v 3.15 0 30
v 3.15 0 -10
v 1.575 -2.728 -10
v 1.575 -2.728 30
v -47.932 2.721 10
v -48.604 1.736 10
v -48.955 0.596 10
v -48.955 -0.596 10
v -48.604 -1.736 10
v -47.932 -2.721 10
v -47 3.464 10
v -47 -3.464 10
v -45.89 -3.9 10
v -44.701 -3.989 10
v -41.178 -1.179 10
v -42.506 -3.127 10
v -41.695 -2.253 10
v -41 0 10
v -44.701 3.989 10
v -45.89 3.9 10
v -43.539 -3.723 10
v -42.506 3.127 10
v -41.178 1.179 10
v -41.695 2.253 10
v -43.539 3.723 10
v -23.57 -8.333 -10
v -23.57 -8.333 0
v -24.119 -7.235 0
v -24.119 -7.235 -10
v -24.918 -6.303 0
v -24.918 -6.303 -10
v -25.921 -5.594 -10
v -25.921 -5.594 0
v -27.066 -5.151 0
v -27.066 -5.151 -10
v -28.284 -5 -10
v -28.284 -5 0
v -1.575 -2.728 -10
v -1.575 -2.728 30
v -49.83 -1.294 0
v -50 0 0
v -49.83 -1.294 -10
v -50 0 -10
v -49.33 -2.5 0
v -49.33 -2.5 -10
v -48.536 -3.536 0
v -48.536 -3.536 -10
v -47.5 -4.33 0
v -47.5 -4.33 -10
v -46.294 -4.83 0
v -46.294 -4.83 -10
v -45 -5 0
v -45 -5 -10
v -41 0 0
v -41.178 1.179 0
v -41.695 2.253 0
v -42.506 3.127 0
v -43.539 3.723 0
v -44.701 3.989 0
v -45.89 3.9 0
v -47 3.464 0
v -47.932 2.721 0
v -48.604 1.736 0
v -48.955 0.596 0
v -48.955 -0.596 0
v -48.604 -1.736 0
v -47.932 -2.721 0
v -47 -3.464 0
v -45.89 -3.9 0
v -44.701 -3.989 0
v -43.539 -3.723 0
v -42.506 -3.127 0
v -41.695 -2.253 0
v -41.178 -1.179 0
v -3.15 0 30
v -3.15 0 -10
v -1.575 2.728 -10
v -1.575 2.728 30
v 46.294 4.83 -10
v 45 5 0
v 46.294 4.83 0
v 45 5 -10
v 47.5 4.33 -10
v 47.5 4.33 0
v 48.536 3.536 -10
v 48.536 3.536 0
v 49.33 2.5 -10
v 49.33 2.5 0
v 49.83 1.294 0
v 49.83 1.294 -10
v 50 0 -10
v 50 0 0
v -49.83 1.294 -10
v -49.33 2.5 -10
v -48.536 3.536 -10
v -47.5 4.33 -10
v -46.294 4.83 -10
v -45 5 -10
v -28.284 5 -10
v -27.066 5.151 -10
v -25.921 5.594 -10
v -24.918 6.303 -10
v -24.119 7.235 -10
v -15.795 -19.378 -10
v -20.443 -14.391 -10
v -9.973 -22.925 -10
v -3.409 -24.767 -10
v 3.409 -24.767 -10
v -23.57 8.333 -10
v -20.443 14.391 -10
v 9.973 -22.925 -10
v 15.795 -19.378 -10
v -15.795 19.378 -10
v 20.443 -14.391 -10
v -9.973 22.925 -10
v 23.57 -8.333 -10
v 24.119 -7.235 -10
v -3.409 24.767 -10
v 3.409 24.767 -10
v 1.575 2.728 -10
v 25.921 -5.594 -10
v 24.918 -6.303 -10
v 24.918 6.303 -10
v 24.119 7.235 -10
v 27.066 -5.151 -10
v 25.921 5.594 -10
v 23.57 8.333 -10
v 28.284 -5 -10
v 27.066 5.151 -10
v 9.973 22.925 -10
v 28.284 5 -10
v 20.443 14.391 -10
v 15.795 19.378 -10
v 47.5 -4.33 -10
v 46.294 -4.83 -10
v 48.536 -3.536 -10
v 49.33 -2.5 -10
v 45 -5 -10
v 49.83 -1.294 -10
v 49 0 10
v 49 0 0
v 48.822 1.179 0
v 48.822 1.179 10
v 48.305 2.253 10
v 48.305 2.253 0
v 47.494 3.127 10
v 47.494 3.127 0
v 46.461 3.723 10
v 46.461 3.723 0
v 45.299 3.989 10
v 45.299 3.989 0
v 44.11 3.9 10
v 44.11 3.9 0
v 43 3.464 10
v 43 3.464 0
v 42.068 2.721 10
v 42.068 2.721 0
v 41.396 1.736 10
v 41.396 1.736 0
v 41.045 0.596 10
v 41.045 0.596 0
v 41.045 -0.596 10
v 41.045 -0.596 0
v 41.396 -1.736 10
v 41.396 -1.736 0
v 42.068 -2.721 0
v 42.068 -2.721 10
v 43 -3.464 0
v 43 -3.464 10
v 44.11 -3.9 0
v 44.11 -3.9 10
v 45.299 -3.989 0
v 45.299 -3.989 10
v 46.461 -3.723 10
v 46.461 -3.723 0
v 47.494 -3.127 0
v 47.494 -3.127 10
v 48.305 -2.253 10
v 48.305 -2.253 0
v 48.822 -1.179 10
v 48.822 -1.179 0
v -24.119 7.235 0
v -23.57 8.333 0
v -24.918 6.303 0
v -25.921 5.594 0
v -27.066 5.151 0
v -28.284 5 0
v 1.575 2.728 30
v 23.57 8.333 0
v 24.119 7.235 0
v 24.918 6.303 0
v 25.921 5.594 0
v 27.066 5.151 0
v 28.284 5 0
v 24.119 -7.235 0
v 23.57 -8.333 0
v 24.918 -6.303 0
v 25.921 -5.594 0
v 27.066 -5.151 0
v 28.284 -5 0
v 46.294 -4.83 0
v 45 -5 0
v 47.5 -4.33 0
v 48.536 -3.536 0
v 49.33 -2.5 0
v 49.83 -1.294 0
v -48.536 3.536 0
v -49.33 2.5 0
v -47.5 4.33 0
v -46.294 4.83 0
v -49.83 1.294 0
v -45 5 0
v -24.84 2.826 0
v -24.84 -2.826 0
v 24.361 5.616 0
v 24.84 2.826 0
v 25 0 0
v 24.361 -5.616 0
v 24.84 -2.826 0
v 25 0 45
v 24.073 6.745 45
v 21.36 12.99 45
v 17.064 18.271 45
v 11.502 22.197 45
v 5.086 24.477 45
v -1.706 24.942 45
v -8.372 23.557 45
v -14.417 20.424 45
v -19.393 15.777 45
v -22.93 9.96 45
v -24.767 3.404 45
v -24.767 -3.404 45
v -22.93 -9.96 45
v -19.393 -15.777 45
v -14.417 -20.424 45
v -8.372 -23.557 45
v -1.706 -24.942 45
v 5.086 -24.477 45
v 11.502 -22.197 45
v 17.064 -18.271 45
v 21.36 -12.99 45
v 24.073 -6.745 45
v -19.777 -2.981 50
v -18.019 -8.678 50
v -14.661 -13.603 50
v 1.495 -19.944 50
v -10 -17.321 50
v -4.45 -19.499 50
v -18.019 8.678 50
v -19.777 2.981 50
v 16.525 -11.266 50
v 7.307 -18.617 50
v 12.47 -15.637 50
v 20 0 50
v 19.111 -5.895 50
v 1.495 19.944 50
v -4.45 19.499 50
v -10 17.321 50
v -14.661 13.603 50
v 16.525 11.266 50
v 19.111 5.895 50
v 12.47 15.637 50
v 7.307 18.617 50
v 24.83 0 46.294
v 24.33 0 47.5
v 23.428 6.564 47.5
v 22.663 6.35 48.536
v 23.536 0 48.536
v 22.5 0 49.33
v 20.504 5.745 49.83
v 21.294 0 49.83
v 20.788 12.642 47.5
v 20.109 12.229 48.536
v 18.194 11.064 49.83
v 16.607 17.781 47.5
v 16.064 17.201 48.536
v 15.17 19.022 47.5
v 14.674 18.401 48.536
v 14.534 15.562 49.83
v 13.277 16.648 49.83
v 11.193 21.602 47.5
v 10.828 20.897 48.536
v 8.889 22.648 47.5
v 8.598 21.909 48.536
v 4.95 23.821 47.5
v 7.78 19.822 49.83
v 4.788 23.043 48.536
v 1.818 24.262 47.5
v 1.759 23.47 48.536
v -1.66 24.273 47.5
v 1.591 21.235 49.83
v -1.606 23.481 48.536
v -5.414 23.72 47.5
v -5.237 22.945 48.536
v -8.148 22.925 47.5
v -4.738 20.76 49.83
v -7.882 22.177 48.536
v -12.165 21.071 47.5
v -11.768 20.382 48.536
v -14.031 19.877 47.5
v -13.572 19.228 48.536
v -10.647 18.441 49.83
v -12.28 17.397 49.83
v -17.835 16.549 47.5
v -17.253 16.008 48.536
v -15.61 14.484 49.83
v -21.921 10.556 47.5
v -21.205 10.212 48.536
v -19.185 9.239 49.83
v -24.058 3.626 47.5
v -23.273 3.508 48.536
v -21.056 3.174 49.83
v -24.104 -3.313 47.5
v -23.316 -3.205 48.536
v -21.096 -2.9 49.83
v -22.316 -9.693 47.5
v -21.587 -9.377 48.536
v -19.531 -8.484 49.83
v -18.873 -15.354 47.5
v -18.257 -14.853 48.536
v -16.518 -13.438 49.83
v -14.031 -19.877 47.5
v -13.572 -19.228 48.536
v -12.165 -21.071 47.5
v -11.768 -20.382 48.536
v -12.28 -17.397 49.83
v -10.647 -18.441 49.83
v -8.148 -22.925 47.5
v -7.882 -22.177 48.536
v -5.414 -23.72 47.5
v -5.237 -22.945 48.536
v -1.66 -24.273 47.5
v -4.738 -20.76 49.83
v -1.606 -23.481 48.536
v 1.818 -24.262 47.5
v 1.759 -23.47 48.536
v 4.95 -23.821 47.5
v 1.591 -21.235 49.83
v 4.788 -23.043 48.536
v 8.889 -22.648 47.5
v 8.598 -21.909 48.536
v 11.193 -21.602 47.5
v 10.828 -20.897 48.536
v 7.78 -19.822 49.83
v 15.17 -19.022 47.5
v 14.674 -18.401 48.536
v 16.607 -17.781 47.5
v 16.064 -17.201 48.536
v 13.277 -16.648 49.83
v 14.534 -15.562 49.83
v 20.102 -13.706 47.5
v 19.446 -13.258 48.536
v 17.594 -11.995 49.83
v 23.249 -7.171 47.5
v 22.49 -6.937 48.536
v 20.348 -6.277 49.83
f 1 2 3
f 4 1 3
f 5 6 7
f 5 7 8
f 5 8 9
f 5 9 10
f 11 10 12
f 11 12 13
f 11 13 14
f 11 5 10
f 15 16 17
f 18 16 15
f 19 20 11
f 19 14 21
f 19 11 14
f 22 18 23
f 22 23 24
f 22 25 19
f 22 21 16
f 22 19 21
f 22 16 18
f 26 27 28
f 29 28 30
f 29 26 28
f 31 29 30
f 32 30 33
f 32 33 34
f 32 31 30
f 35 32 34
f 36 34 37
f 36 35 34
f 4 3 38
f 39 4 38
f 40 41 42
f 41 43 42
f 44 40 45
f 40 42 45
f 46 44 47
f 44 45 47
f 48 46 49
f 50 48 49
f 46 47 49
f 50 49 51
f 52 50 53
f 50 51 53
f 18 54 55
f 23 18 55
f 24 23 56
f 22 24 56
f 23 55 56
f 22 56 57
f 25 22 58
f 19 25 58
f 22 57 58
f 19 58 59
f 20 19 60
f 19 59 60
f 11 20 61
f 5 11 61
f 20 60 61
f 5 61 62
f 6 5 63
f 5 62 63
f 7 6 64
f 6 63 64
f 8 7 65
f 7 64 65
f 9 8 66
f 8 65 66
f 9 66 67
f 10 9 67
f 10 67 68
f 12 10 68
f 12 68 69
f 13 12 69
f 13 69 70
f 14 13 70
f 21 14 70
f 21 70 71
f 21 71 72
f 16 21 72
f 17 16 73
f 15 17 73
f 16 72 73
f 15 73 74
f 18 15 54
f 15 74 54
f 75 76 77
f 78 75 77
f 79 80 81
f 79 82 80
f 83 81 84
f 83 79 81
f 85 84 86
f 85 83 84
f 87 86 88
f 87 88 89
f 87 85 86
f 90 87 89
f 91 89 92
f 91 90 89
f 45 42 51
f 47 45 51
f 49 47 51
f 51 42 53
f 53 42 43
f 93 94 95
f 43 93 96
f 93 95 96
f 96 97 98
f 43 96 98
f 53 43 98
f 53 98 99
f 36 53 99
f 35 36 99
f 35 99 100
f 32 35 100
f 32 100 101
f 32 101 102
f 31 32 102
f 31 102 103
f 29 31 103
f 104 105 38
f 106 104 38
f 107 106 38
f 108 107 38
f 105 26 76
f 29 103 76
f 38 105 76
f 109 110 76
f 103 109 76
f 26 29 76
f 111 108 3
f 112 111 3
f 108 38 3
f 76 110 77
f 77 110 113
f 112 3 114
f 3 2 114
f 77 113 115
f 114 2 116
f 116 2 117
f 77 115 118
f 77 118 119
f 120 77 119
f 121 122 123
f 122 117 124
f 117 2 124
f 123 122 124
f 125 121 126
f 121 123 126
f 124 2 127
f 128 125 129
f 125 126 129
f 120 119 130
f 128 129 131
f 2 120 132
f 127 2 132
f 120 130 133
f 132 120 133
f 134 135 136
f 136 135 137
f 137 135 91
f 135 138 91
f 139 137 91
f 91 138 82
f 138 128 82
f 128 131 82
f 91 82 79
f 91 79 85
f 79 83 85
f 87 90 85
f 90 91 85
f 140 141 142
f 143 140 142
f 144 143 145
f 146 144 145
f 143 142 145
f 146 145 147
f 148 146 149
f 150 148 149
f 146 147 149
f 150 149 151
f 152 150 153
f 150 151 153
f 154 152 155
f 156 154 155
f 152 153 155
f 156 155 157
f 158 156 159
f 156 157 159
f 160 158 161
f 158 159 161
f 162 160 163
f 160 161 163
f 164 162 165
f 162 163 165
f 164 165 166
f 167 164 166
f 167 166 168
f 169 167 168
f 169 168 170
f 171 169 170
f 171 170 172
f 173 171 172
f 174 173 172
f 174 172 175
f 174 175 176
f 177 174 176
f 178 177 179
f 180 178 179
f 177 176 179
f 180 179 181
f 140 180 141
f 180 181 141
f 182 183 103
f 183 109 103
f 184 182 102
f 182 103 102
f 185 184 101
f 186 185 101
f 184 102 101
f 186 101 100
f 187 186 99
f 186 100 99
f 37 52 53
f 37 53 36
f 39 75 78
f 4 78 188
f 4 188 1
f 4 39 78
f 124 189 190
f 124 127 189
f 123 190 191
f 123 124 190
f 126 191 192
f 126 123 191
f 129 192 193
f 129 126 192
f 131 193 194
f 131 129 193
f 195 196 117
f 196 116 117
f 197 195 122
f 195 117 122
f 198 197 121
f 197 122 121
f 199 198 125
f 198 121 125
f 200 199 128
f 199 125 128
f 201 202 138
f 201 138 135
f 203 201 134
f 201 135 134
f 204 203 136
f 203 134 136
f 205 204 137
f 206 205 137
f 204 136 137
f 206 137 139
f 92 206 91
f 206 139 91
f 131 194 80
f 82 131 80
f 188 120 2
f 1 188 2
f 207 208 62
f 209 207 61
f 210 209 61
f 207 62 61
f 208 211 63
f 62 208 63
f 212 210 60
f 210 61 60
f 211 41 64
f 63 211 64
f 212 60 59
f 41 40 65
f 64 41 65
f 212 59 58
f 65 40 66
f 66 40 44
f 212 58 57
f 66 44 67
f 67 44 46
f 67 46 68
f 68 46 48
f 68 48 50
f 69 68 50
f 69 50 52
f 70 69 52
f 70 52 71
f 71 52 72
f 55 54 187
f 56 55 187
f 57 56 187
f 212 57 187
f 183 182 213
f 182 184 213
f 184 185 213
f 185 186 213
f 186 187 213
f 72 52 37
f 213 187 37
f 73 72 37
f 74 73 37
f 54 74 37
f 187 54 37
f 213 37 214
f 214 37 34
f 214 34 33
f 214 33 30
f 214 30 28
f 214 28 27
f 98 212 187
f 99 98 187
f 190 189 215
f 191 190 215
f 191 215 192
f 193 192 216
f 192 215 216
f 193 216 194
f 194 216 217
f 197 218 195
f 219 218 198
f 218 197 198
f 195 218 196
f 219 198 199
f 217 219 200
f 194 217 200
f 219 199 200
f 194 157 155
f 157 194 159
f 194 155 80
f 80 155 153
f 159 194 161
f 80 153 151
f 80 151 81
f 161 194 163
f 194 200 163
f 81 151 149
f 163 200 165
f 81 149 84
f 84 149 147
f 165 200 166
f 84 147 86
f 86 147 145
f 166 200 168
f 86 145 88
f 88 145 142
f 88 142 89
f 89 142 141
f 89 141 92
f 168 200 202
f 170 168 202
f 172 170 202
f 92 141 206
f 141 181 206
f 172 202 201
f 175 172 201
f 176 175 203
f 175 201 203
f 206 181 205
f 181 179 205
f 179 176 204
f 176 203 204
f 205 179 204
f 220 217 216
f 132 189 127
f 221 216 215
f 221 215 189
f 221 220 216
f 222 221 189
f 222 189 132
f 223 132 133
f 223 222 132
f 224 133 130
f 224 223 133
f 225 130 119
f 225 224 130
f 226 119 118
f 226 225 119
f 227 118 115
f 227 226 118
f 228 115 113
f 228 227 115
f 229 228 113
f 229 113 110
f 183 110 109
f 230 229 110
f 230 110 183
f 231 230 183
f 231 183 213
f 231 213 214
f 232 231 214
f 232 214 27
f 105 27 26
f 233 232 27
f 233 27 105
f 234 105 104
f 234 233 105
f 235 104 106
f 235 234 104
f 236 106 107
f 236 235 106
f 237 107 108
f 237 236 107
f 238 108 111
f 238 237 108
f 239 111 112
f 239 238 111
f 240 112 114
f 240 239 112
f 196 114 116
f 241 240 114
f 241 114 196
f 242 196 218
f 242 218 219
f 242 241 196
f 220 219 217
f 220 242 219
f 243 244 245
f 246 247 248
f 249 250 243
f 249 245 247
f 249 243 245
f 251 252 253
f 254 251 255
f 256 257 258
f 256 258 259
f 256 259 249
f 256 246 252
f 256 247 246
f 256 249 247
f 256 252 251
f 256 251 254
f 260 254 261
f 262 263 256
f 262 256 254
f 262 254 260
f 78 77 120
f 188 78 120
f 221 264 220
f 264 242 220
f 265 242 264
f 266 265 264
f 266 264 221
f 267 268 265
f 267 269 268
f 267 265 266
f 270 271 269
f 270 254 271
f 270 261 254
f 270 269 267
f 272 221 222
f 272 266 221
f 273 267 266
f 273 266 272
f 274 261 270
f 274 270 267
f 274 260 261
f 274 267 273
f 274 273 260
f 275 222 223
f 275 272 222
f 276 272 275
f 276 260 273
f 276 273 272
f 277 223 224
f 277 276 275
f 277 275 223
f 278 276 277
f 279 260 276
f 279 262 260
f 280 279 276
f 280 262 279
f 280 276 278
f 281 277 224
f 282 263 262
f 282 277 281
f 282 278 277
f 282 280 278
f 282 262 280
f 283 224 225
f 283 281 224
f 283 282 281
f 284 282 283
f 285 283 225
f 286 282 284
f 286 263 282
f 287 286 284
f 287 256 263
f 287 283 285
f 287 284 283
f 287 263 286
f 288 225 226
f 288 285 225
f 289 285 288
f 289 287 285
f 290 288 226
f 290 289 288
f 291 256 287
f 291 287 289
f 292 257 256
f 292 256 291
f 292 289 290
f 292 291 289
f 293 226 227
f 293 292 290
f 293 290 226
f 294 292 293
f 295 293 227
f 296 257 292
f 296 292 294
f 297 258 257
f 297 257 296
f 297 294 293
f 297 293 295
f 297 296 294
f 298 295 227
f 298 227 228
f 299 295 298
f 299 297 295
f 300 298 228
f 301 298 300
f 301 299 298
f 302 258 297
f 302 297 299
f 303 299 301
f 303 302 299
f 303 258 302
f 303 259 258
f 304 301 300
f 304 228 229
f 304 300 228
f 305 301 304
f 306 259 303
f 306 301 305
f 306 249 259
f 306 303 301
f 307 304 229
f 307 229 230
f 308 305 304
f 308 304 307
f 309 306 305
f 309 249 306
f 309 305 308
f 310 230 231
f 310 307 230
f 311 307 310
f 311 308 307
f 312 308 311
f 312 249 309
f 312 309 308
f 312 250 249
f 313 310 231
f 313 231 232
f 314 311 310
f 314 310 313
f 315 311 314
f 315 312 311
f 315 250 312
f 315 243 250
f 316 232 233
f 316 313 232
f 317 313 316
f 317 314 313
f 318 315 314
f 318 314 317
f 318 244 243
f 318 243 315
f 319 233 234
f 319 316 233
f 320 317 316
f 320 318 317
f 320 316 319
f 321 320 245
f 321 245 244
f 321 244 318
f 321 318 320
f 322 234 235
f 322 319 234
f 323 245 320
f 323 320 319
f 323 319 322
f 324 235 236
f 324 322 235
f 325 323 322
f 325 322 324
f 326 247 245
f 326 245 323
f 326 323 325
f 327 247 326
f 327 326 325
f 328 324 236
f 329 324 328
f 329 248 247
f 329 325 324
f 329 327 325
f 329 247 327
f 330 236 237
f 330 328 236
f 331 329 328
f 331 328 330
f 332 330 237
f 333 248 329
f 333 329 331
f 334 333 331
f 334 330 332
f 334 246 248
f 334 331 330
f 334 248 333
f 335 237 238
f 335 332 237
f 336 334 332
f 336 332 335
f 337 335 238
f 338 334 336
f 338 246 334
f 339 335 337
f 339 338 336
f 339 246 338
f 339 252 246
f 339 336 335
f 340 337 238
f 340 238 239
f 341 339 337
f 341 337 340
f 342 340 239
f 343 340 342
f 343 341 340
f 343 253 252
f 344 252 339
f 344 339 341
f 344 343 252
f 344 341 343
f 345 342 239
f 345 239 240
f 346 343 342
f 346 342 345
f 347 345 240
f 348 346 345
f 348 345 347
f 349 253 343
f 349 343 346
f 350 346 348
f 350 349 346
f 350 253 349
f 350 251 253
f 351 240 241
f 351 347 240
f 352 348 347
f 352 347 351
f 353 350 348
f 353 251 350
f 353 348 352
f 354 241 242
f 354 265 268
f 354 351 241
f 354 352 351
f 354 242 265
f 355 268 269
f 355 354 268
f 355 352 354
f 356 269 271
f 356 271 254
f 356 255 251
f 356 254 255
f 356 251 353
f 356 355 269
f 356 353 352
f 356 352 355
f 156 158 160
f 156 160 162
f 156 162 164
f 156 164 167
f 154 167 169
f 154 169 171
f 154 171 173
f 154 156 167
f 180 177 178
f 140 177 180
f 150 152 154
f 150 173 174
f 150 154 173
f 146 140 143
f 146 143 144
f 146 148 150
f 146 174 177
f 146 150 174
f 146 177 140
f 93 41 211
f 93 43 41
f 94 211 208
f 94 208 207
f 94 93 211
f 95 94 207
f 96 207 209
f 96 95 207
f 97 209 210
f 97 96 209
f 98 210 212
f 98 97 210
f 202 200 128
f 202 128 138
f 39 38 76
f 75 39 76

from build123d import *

# Parameters (mm, degrees)
F0_R      = 25
F1_DEPTH  = 50
F2_R      = 5
F3_W      = 100
F3_H      = 10
F4_DEPTH  = 10
F5_R      = 4.99999
F6_R      = 4
F7_DEPTH  = 10
F8_DEPTH  = 10
F10_DEPTH = 40
F11_R     = 5


# Not quite as in the source:
# - a fillet or chamfer is up to 0.001 mm smaller than in the source, because OpenCascade refuses the exact size


with BuildPart() as f1:
    # F0 (on Top) → F1 (new body)
    with BuildSketch(Plane.XY):
        Circle(F0_R)
    extrude(amount=F1_DEPTH)

    # F2
    f2_edges = [f1.edges().sort_by_distance(p)[0] for p in [
        (-25, 0, 50),
    ]]
    fillet(f2_edges, radius=F2_R)

    # F3 (on face) → F4 (join)
    with BuildSketch(Plane(origin=(0, 0, 0), x_dir=(1, 0, 0), z_dir=(0, 0, -1))):
        Rectangle(F3_W, F3_H)
    extrude(amount=F4_DEPTH)

    # F5 (radius 5 in the source; OpenCascade refuses exactly that, so slightly less here)
    f5_edges = [f1.edges().sort_by_distance(p)[0] for p in [
        (-50, 5, -5),
        (-50, -5, -5),
        (50, -5, -5),
        (50, 5, -5),
    ]]
    fillet(f5_edges, radius=F5_R)

    # F6 (on face) → F7 (join)
    with BuildSketch(Plane.XY):
        with Locations((-45, 0)):
            Circle(F6_R)
        with Locations((45, 0)):
            Circle(F6_R)
    extrude(amount=F7_DEPTH)

    # F8 (add): faces of the model
    f8_faces = [f1.faces().sort_by_distance(p)[0] for p in [
        (0, -13.3591920493, 0),
        (0, 13.3591920493, 0),
    ]]
    extrude(f8_faces, amount=F8_DEPTH)

    # F9 (on face) → F10 (cut)
    with BuildSketch(Plane(origin=(0, 0, -10), x_dir=(1, 0, 0), z_dir=(0, 0, -1))):
        Polygon((1.575, 2.7279800219), (-1.575, 2.7279800219), (-3.15, 0), (-1.575, -2.7279800219), (1.575, -2.7279800219), (3.15, 0), align=None)
    extrude(amount=-F10_DEPTH, mode=Mode.SUBTRACT)

    # F11
    f11_edges = [f1.edges().sort_by_distance(p)[0] for p in [
        (23.535534, 0, 48.535534),
        (-25, 0, 45),
        (-20, 0, 50),
        (24.494897, 5, -5),
        (24.494897, -5, -5),
        (-24.494897, -5, -5),
        (-24.494897, 5, -5),
    ]]
    fillet(f11_edges, radius=F11_R)


solid = f1.part
